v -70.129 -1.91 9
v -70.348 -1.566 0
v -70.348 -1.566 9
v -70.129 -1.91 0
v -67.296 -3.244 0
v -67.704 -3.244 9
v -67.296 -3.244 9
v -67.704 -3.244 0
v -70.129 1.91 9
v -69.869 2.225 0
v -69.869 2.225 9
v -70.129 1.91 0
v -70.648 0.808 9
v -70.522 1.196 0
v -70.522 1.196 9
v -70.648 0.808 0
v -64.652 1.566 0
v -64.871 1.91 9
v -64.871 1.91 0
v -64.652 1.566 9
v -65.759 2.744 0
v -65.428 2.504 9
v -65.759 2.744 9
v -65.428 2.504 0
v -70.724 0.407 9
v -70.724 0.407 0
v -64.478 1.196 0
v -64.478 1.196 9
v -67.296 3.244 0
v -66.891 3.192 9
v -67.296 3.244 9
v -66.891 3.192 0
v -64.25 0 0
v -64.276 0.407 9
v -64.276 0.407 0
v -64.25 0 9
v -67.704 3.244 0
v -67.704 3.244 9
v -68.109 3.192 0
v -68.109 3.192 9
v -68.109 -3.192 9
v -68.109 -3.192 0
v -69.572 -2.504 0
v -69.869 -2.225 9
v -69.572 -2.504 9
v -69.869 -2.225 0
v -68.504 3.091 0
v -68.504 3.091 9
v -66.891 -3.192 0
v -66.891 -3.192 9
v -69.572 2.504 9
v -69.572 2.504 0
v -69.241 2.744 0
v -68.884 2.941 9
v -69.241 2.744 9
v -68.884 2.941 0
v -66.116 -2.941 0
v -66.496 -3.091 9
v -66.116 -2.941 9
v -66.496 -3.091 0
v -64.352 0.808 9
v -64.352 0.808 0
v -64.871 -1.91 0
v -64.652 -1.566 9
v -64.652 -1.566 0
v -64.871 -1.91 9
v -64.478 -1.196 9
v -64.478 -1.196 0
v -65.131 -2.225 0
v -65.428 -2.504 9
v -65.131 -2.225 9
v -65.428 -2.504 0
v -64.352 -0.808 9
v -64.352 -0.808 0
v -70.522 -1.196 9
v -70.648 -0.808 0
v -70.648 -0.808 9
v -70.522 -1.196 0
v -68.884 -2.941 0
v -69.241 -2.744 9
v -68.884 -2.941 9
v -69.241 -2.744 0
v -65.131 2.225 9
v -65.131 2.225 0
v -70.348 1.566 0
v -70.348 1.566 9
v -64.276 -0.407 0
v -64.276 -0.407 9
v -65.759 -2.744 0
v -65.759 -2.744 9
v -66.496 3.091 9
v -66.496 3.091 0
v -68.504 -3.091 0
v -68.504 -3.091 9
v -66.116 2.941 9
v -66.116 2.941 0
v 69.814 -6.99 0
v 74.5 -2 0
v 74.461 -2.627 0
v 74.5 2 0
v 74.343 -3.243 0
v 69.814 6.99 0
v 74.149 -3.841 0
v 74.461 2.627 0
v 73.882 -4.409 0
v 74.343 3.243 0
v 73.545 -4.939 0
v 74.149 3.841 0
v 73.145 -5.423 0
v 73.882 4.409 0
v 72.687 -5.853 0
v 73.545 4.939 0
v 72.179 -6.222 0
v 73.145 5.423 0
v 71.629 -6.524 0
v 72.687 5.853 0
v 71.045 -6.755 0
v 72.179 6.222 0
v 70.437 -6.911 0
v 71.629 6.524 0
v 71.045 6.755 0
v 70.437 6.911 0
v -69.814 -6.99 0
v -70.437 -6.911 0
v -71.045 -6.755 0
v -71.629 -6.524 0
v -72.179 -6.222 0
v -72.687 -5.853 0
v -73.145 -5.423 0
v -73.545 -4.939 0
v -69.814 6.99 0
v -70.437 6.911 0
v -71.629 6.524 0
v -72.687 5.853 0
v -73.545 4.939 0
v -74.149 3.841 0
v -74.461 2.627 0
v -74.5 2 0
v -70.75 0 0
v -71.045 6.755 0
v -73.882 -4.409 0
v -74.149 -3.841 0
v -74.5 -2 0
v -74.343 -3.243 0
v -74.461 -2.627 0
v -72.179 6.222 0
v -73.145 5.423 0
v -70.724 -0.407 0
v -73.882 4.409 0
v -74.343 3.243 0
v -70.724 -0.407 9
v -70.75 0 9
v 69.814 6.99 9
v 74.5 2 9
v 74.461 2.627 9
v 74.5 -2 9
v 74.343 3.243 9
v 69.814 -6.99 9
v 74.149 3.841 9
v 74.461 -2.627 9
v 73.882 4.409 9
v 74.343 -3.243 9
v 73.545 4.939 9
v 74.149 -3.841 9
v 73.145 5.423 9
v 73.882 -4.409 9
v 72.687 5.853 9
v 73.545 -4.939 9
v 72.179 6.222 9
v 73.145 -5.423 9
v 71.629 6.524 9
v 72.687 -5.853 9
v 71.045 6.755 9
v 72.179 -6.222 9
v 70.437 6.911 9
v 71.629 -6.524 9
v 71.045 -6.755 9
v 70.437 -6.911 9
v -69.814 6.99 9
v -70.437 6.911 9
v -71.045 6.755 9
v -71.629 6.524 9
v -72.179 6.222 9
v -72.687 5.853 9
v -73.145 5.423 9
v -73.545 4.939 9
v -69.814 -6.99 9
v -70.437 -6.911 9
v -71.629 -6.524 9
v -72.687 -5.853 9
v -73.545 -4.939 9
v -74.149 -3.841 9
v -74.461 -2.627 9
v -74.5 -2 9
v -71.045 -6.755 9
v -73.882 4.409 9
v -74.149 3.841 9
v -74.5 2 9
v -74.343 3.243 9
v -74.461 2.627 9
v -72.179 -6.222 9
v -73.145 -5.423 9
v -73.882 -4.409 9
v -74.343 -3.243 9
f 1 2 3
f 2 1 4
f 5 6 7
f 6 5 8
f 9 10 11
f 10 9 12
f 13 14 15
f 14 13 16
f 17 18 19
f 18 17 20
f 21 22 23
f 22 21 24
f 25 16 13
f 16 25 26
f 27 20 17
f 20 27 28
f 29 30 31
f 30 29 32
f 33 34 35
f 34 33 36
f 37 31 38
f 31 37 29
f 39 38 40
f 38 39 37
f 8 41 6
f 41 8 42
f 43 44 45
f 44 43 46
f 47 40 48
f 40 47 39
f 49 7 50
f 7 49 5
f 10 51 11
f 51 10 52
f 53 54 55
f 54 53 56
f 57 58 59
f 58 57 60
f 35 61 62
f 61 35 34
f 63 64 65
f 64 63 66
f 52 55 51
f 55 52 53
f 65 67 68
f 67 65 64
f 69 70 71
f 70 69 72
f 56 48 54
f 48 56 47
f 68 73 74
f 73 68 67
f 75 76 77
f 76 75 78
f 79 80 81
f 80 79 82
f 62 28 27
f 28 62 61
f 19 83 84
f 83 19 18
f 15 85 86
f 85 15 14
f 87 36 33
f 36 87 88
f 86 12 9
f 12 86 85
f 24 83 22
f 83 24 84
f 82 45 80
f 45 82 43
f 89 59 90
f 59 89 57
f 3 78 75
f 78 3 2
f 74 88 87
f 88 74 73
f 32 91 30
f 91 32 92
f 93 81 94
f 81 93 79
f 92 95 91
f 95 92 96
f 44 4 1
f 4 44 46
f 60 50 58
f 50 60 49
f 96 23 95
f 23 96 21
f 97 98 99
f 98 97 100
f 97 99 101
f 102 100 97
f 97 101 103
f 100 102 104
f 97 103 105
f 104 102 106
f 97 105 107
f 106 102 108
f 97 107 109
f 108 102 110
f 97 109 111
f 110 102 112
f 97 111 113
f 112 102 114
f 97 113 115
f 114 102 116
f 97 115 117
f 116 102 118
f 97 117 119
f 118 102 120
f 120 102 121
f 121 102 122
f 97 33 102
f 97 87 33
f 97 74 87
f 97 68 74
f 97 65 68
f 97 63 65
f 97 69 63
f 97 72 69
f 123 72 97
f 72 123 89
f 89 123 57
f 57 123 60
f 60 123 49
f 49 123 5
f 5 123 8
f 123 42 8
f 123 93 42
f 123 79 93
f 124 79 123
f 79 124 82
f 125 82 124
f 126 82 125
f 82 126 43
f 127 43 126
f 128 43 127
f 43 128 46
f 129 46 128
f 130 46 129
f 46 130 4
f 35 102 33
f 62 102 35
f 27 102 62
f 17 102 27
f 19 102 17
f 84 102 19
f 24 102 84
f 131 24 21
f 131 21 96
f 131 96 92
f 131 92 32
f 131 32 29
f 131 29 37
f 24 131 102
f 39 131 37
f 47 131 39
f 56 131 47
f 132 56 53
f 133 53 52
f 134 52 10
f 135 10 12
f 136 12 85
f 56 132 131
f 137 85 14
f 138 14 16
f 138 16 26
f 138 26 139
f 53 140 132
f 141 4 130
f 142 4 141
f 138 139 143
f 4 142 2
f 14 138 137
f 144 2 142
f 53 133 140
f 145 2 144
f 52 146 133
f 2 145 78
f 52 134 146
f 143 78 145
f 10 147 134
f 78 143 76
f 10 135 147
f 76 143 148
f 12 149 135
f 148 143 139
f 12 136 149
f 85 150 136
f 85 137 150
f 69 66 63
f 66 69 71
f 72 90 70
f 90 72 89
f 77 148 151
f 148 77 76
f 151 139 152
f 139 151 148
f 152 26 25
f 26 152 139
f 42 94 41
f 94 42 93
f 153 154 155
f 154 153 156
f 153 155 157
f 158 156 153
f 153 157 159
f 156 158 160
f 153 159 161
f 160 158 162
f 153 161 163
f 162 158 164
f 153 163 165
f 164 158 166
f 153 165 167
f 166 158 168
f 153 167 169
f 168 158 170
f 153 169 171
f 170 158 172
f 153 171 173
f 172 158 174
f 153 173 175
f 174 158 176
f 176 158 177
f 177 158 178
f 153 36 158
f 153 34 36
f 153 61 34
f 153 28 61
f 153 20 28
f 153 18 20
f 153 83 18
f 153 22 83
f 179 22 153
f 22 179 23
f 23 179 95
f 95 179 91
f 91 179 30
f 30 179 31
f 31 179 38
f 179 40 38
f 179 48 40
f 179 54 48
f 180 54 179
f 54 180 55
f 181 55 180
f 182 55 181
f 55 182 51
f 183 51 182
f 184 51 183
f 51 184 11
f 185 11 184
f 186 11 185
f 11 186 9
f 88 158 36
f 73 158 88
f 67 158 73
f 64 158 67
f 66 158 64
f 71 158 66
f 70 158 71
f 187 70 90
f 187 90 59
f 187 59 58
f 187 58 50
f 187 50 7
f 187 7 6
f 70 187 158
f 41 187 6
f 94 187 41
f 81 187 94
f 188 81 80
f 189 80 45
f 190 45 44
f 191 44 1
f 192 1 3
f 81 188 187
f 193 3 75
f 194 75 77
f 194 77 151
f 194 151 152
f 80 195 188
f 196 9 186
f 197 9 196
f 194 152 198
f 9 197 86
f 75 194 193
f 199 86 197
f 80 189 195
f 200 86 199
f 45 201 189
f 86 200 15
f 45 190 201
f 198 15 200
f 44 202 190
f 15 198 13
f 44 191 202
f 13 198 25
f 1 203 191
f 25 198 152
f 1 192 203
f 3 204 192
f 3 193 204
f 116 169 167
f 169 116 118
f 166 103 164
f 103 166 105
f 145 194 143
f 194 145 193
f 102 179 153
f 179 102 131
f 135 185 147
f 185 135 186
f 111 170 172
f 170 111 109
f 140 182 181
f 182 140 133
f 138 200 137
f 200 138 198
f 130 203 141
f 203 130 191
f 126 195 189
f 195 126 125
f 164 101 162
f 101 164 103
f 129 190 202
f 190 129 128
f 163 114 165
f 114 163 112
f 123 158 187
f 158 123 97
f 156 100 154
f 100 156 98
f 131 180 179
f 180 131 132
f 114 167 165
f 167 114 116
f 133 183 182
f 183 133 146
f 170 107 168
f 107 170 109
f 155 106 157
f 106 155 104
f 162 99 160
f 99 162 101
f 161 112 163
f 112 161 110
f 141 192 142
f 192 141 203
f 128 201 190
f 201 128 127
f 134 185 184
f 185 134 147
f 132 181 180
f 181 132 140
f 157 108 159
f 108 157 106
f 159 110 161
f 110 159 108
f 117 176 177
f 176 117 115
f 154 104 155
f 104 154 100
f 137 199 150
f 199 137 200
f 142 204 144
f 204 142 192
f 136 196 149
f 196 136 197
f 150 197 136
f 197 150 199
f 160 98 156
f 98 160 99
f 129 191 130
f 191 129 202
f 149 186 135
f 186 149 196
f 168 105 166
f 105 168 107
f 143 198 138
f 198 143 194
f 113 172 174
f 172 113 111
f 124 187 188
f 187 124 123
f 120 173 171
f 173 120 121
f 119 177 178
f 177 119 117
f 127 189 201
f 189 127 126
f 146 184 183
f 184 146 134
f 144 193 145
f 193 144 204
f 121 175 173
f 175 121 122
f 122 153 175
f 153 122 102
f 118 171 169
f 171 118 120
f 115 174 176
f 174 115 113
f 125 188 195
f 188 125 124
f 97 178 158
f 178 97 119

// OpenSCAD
$fn = 50;


difference() {
	union() {
		hull() {
			translate(v = [-69.5000000000, 2.0000000000, 0]) {
				cylinder(h = 9, r = 5);
			}
			translate(v = [69.5000000000, 2.0000000000, 0]) {
				cylinder(h = 9, r = 5);
			}
			translate(v = [-69.5000000000, -2.0000000000, 0]) {
				cylinder(h = 9, r = 5);
			}
			translate(v = [69.5000000000, -2.0000000000, 0]) {
				cylinder(h = 9, r = 5);
			}
		}
	}
	union() {
		translate(v = [-67.5000000000, 0.0000000000, 0]) {
			cylinder(h = 9, r = 3.2500000000);
		}
		translate(v = [-67.5000000000, 0.0000000000, 0]) {
			cylinder(h = 9, r = 1.8000000000);
		}
		translate(v = [-67.5000000000, 0.0000000000, 0]) {
			cylinder(h = 9, r = 1.8000000000);
		}
		translate(v = [-67.5000000000, 0.0000000000, 0]) {
			cylinder(h = 9, r = 1.8000000000);
		}
	}
}
